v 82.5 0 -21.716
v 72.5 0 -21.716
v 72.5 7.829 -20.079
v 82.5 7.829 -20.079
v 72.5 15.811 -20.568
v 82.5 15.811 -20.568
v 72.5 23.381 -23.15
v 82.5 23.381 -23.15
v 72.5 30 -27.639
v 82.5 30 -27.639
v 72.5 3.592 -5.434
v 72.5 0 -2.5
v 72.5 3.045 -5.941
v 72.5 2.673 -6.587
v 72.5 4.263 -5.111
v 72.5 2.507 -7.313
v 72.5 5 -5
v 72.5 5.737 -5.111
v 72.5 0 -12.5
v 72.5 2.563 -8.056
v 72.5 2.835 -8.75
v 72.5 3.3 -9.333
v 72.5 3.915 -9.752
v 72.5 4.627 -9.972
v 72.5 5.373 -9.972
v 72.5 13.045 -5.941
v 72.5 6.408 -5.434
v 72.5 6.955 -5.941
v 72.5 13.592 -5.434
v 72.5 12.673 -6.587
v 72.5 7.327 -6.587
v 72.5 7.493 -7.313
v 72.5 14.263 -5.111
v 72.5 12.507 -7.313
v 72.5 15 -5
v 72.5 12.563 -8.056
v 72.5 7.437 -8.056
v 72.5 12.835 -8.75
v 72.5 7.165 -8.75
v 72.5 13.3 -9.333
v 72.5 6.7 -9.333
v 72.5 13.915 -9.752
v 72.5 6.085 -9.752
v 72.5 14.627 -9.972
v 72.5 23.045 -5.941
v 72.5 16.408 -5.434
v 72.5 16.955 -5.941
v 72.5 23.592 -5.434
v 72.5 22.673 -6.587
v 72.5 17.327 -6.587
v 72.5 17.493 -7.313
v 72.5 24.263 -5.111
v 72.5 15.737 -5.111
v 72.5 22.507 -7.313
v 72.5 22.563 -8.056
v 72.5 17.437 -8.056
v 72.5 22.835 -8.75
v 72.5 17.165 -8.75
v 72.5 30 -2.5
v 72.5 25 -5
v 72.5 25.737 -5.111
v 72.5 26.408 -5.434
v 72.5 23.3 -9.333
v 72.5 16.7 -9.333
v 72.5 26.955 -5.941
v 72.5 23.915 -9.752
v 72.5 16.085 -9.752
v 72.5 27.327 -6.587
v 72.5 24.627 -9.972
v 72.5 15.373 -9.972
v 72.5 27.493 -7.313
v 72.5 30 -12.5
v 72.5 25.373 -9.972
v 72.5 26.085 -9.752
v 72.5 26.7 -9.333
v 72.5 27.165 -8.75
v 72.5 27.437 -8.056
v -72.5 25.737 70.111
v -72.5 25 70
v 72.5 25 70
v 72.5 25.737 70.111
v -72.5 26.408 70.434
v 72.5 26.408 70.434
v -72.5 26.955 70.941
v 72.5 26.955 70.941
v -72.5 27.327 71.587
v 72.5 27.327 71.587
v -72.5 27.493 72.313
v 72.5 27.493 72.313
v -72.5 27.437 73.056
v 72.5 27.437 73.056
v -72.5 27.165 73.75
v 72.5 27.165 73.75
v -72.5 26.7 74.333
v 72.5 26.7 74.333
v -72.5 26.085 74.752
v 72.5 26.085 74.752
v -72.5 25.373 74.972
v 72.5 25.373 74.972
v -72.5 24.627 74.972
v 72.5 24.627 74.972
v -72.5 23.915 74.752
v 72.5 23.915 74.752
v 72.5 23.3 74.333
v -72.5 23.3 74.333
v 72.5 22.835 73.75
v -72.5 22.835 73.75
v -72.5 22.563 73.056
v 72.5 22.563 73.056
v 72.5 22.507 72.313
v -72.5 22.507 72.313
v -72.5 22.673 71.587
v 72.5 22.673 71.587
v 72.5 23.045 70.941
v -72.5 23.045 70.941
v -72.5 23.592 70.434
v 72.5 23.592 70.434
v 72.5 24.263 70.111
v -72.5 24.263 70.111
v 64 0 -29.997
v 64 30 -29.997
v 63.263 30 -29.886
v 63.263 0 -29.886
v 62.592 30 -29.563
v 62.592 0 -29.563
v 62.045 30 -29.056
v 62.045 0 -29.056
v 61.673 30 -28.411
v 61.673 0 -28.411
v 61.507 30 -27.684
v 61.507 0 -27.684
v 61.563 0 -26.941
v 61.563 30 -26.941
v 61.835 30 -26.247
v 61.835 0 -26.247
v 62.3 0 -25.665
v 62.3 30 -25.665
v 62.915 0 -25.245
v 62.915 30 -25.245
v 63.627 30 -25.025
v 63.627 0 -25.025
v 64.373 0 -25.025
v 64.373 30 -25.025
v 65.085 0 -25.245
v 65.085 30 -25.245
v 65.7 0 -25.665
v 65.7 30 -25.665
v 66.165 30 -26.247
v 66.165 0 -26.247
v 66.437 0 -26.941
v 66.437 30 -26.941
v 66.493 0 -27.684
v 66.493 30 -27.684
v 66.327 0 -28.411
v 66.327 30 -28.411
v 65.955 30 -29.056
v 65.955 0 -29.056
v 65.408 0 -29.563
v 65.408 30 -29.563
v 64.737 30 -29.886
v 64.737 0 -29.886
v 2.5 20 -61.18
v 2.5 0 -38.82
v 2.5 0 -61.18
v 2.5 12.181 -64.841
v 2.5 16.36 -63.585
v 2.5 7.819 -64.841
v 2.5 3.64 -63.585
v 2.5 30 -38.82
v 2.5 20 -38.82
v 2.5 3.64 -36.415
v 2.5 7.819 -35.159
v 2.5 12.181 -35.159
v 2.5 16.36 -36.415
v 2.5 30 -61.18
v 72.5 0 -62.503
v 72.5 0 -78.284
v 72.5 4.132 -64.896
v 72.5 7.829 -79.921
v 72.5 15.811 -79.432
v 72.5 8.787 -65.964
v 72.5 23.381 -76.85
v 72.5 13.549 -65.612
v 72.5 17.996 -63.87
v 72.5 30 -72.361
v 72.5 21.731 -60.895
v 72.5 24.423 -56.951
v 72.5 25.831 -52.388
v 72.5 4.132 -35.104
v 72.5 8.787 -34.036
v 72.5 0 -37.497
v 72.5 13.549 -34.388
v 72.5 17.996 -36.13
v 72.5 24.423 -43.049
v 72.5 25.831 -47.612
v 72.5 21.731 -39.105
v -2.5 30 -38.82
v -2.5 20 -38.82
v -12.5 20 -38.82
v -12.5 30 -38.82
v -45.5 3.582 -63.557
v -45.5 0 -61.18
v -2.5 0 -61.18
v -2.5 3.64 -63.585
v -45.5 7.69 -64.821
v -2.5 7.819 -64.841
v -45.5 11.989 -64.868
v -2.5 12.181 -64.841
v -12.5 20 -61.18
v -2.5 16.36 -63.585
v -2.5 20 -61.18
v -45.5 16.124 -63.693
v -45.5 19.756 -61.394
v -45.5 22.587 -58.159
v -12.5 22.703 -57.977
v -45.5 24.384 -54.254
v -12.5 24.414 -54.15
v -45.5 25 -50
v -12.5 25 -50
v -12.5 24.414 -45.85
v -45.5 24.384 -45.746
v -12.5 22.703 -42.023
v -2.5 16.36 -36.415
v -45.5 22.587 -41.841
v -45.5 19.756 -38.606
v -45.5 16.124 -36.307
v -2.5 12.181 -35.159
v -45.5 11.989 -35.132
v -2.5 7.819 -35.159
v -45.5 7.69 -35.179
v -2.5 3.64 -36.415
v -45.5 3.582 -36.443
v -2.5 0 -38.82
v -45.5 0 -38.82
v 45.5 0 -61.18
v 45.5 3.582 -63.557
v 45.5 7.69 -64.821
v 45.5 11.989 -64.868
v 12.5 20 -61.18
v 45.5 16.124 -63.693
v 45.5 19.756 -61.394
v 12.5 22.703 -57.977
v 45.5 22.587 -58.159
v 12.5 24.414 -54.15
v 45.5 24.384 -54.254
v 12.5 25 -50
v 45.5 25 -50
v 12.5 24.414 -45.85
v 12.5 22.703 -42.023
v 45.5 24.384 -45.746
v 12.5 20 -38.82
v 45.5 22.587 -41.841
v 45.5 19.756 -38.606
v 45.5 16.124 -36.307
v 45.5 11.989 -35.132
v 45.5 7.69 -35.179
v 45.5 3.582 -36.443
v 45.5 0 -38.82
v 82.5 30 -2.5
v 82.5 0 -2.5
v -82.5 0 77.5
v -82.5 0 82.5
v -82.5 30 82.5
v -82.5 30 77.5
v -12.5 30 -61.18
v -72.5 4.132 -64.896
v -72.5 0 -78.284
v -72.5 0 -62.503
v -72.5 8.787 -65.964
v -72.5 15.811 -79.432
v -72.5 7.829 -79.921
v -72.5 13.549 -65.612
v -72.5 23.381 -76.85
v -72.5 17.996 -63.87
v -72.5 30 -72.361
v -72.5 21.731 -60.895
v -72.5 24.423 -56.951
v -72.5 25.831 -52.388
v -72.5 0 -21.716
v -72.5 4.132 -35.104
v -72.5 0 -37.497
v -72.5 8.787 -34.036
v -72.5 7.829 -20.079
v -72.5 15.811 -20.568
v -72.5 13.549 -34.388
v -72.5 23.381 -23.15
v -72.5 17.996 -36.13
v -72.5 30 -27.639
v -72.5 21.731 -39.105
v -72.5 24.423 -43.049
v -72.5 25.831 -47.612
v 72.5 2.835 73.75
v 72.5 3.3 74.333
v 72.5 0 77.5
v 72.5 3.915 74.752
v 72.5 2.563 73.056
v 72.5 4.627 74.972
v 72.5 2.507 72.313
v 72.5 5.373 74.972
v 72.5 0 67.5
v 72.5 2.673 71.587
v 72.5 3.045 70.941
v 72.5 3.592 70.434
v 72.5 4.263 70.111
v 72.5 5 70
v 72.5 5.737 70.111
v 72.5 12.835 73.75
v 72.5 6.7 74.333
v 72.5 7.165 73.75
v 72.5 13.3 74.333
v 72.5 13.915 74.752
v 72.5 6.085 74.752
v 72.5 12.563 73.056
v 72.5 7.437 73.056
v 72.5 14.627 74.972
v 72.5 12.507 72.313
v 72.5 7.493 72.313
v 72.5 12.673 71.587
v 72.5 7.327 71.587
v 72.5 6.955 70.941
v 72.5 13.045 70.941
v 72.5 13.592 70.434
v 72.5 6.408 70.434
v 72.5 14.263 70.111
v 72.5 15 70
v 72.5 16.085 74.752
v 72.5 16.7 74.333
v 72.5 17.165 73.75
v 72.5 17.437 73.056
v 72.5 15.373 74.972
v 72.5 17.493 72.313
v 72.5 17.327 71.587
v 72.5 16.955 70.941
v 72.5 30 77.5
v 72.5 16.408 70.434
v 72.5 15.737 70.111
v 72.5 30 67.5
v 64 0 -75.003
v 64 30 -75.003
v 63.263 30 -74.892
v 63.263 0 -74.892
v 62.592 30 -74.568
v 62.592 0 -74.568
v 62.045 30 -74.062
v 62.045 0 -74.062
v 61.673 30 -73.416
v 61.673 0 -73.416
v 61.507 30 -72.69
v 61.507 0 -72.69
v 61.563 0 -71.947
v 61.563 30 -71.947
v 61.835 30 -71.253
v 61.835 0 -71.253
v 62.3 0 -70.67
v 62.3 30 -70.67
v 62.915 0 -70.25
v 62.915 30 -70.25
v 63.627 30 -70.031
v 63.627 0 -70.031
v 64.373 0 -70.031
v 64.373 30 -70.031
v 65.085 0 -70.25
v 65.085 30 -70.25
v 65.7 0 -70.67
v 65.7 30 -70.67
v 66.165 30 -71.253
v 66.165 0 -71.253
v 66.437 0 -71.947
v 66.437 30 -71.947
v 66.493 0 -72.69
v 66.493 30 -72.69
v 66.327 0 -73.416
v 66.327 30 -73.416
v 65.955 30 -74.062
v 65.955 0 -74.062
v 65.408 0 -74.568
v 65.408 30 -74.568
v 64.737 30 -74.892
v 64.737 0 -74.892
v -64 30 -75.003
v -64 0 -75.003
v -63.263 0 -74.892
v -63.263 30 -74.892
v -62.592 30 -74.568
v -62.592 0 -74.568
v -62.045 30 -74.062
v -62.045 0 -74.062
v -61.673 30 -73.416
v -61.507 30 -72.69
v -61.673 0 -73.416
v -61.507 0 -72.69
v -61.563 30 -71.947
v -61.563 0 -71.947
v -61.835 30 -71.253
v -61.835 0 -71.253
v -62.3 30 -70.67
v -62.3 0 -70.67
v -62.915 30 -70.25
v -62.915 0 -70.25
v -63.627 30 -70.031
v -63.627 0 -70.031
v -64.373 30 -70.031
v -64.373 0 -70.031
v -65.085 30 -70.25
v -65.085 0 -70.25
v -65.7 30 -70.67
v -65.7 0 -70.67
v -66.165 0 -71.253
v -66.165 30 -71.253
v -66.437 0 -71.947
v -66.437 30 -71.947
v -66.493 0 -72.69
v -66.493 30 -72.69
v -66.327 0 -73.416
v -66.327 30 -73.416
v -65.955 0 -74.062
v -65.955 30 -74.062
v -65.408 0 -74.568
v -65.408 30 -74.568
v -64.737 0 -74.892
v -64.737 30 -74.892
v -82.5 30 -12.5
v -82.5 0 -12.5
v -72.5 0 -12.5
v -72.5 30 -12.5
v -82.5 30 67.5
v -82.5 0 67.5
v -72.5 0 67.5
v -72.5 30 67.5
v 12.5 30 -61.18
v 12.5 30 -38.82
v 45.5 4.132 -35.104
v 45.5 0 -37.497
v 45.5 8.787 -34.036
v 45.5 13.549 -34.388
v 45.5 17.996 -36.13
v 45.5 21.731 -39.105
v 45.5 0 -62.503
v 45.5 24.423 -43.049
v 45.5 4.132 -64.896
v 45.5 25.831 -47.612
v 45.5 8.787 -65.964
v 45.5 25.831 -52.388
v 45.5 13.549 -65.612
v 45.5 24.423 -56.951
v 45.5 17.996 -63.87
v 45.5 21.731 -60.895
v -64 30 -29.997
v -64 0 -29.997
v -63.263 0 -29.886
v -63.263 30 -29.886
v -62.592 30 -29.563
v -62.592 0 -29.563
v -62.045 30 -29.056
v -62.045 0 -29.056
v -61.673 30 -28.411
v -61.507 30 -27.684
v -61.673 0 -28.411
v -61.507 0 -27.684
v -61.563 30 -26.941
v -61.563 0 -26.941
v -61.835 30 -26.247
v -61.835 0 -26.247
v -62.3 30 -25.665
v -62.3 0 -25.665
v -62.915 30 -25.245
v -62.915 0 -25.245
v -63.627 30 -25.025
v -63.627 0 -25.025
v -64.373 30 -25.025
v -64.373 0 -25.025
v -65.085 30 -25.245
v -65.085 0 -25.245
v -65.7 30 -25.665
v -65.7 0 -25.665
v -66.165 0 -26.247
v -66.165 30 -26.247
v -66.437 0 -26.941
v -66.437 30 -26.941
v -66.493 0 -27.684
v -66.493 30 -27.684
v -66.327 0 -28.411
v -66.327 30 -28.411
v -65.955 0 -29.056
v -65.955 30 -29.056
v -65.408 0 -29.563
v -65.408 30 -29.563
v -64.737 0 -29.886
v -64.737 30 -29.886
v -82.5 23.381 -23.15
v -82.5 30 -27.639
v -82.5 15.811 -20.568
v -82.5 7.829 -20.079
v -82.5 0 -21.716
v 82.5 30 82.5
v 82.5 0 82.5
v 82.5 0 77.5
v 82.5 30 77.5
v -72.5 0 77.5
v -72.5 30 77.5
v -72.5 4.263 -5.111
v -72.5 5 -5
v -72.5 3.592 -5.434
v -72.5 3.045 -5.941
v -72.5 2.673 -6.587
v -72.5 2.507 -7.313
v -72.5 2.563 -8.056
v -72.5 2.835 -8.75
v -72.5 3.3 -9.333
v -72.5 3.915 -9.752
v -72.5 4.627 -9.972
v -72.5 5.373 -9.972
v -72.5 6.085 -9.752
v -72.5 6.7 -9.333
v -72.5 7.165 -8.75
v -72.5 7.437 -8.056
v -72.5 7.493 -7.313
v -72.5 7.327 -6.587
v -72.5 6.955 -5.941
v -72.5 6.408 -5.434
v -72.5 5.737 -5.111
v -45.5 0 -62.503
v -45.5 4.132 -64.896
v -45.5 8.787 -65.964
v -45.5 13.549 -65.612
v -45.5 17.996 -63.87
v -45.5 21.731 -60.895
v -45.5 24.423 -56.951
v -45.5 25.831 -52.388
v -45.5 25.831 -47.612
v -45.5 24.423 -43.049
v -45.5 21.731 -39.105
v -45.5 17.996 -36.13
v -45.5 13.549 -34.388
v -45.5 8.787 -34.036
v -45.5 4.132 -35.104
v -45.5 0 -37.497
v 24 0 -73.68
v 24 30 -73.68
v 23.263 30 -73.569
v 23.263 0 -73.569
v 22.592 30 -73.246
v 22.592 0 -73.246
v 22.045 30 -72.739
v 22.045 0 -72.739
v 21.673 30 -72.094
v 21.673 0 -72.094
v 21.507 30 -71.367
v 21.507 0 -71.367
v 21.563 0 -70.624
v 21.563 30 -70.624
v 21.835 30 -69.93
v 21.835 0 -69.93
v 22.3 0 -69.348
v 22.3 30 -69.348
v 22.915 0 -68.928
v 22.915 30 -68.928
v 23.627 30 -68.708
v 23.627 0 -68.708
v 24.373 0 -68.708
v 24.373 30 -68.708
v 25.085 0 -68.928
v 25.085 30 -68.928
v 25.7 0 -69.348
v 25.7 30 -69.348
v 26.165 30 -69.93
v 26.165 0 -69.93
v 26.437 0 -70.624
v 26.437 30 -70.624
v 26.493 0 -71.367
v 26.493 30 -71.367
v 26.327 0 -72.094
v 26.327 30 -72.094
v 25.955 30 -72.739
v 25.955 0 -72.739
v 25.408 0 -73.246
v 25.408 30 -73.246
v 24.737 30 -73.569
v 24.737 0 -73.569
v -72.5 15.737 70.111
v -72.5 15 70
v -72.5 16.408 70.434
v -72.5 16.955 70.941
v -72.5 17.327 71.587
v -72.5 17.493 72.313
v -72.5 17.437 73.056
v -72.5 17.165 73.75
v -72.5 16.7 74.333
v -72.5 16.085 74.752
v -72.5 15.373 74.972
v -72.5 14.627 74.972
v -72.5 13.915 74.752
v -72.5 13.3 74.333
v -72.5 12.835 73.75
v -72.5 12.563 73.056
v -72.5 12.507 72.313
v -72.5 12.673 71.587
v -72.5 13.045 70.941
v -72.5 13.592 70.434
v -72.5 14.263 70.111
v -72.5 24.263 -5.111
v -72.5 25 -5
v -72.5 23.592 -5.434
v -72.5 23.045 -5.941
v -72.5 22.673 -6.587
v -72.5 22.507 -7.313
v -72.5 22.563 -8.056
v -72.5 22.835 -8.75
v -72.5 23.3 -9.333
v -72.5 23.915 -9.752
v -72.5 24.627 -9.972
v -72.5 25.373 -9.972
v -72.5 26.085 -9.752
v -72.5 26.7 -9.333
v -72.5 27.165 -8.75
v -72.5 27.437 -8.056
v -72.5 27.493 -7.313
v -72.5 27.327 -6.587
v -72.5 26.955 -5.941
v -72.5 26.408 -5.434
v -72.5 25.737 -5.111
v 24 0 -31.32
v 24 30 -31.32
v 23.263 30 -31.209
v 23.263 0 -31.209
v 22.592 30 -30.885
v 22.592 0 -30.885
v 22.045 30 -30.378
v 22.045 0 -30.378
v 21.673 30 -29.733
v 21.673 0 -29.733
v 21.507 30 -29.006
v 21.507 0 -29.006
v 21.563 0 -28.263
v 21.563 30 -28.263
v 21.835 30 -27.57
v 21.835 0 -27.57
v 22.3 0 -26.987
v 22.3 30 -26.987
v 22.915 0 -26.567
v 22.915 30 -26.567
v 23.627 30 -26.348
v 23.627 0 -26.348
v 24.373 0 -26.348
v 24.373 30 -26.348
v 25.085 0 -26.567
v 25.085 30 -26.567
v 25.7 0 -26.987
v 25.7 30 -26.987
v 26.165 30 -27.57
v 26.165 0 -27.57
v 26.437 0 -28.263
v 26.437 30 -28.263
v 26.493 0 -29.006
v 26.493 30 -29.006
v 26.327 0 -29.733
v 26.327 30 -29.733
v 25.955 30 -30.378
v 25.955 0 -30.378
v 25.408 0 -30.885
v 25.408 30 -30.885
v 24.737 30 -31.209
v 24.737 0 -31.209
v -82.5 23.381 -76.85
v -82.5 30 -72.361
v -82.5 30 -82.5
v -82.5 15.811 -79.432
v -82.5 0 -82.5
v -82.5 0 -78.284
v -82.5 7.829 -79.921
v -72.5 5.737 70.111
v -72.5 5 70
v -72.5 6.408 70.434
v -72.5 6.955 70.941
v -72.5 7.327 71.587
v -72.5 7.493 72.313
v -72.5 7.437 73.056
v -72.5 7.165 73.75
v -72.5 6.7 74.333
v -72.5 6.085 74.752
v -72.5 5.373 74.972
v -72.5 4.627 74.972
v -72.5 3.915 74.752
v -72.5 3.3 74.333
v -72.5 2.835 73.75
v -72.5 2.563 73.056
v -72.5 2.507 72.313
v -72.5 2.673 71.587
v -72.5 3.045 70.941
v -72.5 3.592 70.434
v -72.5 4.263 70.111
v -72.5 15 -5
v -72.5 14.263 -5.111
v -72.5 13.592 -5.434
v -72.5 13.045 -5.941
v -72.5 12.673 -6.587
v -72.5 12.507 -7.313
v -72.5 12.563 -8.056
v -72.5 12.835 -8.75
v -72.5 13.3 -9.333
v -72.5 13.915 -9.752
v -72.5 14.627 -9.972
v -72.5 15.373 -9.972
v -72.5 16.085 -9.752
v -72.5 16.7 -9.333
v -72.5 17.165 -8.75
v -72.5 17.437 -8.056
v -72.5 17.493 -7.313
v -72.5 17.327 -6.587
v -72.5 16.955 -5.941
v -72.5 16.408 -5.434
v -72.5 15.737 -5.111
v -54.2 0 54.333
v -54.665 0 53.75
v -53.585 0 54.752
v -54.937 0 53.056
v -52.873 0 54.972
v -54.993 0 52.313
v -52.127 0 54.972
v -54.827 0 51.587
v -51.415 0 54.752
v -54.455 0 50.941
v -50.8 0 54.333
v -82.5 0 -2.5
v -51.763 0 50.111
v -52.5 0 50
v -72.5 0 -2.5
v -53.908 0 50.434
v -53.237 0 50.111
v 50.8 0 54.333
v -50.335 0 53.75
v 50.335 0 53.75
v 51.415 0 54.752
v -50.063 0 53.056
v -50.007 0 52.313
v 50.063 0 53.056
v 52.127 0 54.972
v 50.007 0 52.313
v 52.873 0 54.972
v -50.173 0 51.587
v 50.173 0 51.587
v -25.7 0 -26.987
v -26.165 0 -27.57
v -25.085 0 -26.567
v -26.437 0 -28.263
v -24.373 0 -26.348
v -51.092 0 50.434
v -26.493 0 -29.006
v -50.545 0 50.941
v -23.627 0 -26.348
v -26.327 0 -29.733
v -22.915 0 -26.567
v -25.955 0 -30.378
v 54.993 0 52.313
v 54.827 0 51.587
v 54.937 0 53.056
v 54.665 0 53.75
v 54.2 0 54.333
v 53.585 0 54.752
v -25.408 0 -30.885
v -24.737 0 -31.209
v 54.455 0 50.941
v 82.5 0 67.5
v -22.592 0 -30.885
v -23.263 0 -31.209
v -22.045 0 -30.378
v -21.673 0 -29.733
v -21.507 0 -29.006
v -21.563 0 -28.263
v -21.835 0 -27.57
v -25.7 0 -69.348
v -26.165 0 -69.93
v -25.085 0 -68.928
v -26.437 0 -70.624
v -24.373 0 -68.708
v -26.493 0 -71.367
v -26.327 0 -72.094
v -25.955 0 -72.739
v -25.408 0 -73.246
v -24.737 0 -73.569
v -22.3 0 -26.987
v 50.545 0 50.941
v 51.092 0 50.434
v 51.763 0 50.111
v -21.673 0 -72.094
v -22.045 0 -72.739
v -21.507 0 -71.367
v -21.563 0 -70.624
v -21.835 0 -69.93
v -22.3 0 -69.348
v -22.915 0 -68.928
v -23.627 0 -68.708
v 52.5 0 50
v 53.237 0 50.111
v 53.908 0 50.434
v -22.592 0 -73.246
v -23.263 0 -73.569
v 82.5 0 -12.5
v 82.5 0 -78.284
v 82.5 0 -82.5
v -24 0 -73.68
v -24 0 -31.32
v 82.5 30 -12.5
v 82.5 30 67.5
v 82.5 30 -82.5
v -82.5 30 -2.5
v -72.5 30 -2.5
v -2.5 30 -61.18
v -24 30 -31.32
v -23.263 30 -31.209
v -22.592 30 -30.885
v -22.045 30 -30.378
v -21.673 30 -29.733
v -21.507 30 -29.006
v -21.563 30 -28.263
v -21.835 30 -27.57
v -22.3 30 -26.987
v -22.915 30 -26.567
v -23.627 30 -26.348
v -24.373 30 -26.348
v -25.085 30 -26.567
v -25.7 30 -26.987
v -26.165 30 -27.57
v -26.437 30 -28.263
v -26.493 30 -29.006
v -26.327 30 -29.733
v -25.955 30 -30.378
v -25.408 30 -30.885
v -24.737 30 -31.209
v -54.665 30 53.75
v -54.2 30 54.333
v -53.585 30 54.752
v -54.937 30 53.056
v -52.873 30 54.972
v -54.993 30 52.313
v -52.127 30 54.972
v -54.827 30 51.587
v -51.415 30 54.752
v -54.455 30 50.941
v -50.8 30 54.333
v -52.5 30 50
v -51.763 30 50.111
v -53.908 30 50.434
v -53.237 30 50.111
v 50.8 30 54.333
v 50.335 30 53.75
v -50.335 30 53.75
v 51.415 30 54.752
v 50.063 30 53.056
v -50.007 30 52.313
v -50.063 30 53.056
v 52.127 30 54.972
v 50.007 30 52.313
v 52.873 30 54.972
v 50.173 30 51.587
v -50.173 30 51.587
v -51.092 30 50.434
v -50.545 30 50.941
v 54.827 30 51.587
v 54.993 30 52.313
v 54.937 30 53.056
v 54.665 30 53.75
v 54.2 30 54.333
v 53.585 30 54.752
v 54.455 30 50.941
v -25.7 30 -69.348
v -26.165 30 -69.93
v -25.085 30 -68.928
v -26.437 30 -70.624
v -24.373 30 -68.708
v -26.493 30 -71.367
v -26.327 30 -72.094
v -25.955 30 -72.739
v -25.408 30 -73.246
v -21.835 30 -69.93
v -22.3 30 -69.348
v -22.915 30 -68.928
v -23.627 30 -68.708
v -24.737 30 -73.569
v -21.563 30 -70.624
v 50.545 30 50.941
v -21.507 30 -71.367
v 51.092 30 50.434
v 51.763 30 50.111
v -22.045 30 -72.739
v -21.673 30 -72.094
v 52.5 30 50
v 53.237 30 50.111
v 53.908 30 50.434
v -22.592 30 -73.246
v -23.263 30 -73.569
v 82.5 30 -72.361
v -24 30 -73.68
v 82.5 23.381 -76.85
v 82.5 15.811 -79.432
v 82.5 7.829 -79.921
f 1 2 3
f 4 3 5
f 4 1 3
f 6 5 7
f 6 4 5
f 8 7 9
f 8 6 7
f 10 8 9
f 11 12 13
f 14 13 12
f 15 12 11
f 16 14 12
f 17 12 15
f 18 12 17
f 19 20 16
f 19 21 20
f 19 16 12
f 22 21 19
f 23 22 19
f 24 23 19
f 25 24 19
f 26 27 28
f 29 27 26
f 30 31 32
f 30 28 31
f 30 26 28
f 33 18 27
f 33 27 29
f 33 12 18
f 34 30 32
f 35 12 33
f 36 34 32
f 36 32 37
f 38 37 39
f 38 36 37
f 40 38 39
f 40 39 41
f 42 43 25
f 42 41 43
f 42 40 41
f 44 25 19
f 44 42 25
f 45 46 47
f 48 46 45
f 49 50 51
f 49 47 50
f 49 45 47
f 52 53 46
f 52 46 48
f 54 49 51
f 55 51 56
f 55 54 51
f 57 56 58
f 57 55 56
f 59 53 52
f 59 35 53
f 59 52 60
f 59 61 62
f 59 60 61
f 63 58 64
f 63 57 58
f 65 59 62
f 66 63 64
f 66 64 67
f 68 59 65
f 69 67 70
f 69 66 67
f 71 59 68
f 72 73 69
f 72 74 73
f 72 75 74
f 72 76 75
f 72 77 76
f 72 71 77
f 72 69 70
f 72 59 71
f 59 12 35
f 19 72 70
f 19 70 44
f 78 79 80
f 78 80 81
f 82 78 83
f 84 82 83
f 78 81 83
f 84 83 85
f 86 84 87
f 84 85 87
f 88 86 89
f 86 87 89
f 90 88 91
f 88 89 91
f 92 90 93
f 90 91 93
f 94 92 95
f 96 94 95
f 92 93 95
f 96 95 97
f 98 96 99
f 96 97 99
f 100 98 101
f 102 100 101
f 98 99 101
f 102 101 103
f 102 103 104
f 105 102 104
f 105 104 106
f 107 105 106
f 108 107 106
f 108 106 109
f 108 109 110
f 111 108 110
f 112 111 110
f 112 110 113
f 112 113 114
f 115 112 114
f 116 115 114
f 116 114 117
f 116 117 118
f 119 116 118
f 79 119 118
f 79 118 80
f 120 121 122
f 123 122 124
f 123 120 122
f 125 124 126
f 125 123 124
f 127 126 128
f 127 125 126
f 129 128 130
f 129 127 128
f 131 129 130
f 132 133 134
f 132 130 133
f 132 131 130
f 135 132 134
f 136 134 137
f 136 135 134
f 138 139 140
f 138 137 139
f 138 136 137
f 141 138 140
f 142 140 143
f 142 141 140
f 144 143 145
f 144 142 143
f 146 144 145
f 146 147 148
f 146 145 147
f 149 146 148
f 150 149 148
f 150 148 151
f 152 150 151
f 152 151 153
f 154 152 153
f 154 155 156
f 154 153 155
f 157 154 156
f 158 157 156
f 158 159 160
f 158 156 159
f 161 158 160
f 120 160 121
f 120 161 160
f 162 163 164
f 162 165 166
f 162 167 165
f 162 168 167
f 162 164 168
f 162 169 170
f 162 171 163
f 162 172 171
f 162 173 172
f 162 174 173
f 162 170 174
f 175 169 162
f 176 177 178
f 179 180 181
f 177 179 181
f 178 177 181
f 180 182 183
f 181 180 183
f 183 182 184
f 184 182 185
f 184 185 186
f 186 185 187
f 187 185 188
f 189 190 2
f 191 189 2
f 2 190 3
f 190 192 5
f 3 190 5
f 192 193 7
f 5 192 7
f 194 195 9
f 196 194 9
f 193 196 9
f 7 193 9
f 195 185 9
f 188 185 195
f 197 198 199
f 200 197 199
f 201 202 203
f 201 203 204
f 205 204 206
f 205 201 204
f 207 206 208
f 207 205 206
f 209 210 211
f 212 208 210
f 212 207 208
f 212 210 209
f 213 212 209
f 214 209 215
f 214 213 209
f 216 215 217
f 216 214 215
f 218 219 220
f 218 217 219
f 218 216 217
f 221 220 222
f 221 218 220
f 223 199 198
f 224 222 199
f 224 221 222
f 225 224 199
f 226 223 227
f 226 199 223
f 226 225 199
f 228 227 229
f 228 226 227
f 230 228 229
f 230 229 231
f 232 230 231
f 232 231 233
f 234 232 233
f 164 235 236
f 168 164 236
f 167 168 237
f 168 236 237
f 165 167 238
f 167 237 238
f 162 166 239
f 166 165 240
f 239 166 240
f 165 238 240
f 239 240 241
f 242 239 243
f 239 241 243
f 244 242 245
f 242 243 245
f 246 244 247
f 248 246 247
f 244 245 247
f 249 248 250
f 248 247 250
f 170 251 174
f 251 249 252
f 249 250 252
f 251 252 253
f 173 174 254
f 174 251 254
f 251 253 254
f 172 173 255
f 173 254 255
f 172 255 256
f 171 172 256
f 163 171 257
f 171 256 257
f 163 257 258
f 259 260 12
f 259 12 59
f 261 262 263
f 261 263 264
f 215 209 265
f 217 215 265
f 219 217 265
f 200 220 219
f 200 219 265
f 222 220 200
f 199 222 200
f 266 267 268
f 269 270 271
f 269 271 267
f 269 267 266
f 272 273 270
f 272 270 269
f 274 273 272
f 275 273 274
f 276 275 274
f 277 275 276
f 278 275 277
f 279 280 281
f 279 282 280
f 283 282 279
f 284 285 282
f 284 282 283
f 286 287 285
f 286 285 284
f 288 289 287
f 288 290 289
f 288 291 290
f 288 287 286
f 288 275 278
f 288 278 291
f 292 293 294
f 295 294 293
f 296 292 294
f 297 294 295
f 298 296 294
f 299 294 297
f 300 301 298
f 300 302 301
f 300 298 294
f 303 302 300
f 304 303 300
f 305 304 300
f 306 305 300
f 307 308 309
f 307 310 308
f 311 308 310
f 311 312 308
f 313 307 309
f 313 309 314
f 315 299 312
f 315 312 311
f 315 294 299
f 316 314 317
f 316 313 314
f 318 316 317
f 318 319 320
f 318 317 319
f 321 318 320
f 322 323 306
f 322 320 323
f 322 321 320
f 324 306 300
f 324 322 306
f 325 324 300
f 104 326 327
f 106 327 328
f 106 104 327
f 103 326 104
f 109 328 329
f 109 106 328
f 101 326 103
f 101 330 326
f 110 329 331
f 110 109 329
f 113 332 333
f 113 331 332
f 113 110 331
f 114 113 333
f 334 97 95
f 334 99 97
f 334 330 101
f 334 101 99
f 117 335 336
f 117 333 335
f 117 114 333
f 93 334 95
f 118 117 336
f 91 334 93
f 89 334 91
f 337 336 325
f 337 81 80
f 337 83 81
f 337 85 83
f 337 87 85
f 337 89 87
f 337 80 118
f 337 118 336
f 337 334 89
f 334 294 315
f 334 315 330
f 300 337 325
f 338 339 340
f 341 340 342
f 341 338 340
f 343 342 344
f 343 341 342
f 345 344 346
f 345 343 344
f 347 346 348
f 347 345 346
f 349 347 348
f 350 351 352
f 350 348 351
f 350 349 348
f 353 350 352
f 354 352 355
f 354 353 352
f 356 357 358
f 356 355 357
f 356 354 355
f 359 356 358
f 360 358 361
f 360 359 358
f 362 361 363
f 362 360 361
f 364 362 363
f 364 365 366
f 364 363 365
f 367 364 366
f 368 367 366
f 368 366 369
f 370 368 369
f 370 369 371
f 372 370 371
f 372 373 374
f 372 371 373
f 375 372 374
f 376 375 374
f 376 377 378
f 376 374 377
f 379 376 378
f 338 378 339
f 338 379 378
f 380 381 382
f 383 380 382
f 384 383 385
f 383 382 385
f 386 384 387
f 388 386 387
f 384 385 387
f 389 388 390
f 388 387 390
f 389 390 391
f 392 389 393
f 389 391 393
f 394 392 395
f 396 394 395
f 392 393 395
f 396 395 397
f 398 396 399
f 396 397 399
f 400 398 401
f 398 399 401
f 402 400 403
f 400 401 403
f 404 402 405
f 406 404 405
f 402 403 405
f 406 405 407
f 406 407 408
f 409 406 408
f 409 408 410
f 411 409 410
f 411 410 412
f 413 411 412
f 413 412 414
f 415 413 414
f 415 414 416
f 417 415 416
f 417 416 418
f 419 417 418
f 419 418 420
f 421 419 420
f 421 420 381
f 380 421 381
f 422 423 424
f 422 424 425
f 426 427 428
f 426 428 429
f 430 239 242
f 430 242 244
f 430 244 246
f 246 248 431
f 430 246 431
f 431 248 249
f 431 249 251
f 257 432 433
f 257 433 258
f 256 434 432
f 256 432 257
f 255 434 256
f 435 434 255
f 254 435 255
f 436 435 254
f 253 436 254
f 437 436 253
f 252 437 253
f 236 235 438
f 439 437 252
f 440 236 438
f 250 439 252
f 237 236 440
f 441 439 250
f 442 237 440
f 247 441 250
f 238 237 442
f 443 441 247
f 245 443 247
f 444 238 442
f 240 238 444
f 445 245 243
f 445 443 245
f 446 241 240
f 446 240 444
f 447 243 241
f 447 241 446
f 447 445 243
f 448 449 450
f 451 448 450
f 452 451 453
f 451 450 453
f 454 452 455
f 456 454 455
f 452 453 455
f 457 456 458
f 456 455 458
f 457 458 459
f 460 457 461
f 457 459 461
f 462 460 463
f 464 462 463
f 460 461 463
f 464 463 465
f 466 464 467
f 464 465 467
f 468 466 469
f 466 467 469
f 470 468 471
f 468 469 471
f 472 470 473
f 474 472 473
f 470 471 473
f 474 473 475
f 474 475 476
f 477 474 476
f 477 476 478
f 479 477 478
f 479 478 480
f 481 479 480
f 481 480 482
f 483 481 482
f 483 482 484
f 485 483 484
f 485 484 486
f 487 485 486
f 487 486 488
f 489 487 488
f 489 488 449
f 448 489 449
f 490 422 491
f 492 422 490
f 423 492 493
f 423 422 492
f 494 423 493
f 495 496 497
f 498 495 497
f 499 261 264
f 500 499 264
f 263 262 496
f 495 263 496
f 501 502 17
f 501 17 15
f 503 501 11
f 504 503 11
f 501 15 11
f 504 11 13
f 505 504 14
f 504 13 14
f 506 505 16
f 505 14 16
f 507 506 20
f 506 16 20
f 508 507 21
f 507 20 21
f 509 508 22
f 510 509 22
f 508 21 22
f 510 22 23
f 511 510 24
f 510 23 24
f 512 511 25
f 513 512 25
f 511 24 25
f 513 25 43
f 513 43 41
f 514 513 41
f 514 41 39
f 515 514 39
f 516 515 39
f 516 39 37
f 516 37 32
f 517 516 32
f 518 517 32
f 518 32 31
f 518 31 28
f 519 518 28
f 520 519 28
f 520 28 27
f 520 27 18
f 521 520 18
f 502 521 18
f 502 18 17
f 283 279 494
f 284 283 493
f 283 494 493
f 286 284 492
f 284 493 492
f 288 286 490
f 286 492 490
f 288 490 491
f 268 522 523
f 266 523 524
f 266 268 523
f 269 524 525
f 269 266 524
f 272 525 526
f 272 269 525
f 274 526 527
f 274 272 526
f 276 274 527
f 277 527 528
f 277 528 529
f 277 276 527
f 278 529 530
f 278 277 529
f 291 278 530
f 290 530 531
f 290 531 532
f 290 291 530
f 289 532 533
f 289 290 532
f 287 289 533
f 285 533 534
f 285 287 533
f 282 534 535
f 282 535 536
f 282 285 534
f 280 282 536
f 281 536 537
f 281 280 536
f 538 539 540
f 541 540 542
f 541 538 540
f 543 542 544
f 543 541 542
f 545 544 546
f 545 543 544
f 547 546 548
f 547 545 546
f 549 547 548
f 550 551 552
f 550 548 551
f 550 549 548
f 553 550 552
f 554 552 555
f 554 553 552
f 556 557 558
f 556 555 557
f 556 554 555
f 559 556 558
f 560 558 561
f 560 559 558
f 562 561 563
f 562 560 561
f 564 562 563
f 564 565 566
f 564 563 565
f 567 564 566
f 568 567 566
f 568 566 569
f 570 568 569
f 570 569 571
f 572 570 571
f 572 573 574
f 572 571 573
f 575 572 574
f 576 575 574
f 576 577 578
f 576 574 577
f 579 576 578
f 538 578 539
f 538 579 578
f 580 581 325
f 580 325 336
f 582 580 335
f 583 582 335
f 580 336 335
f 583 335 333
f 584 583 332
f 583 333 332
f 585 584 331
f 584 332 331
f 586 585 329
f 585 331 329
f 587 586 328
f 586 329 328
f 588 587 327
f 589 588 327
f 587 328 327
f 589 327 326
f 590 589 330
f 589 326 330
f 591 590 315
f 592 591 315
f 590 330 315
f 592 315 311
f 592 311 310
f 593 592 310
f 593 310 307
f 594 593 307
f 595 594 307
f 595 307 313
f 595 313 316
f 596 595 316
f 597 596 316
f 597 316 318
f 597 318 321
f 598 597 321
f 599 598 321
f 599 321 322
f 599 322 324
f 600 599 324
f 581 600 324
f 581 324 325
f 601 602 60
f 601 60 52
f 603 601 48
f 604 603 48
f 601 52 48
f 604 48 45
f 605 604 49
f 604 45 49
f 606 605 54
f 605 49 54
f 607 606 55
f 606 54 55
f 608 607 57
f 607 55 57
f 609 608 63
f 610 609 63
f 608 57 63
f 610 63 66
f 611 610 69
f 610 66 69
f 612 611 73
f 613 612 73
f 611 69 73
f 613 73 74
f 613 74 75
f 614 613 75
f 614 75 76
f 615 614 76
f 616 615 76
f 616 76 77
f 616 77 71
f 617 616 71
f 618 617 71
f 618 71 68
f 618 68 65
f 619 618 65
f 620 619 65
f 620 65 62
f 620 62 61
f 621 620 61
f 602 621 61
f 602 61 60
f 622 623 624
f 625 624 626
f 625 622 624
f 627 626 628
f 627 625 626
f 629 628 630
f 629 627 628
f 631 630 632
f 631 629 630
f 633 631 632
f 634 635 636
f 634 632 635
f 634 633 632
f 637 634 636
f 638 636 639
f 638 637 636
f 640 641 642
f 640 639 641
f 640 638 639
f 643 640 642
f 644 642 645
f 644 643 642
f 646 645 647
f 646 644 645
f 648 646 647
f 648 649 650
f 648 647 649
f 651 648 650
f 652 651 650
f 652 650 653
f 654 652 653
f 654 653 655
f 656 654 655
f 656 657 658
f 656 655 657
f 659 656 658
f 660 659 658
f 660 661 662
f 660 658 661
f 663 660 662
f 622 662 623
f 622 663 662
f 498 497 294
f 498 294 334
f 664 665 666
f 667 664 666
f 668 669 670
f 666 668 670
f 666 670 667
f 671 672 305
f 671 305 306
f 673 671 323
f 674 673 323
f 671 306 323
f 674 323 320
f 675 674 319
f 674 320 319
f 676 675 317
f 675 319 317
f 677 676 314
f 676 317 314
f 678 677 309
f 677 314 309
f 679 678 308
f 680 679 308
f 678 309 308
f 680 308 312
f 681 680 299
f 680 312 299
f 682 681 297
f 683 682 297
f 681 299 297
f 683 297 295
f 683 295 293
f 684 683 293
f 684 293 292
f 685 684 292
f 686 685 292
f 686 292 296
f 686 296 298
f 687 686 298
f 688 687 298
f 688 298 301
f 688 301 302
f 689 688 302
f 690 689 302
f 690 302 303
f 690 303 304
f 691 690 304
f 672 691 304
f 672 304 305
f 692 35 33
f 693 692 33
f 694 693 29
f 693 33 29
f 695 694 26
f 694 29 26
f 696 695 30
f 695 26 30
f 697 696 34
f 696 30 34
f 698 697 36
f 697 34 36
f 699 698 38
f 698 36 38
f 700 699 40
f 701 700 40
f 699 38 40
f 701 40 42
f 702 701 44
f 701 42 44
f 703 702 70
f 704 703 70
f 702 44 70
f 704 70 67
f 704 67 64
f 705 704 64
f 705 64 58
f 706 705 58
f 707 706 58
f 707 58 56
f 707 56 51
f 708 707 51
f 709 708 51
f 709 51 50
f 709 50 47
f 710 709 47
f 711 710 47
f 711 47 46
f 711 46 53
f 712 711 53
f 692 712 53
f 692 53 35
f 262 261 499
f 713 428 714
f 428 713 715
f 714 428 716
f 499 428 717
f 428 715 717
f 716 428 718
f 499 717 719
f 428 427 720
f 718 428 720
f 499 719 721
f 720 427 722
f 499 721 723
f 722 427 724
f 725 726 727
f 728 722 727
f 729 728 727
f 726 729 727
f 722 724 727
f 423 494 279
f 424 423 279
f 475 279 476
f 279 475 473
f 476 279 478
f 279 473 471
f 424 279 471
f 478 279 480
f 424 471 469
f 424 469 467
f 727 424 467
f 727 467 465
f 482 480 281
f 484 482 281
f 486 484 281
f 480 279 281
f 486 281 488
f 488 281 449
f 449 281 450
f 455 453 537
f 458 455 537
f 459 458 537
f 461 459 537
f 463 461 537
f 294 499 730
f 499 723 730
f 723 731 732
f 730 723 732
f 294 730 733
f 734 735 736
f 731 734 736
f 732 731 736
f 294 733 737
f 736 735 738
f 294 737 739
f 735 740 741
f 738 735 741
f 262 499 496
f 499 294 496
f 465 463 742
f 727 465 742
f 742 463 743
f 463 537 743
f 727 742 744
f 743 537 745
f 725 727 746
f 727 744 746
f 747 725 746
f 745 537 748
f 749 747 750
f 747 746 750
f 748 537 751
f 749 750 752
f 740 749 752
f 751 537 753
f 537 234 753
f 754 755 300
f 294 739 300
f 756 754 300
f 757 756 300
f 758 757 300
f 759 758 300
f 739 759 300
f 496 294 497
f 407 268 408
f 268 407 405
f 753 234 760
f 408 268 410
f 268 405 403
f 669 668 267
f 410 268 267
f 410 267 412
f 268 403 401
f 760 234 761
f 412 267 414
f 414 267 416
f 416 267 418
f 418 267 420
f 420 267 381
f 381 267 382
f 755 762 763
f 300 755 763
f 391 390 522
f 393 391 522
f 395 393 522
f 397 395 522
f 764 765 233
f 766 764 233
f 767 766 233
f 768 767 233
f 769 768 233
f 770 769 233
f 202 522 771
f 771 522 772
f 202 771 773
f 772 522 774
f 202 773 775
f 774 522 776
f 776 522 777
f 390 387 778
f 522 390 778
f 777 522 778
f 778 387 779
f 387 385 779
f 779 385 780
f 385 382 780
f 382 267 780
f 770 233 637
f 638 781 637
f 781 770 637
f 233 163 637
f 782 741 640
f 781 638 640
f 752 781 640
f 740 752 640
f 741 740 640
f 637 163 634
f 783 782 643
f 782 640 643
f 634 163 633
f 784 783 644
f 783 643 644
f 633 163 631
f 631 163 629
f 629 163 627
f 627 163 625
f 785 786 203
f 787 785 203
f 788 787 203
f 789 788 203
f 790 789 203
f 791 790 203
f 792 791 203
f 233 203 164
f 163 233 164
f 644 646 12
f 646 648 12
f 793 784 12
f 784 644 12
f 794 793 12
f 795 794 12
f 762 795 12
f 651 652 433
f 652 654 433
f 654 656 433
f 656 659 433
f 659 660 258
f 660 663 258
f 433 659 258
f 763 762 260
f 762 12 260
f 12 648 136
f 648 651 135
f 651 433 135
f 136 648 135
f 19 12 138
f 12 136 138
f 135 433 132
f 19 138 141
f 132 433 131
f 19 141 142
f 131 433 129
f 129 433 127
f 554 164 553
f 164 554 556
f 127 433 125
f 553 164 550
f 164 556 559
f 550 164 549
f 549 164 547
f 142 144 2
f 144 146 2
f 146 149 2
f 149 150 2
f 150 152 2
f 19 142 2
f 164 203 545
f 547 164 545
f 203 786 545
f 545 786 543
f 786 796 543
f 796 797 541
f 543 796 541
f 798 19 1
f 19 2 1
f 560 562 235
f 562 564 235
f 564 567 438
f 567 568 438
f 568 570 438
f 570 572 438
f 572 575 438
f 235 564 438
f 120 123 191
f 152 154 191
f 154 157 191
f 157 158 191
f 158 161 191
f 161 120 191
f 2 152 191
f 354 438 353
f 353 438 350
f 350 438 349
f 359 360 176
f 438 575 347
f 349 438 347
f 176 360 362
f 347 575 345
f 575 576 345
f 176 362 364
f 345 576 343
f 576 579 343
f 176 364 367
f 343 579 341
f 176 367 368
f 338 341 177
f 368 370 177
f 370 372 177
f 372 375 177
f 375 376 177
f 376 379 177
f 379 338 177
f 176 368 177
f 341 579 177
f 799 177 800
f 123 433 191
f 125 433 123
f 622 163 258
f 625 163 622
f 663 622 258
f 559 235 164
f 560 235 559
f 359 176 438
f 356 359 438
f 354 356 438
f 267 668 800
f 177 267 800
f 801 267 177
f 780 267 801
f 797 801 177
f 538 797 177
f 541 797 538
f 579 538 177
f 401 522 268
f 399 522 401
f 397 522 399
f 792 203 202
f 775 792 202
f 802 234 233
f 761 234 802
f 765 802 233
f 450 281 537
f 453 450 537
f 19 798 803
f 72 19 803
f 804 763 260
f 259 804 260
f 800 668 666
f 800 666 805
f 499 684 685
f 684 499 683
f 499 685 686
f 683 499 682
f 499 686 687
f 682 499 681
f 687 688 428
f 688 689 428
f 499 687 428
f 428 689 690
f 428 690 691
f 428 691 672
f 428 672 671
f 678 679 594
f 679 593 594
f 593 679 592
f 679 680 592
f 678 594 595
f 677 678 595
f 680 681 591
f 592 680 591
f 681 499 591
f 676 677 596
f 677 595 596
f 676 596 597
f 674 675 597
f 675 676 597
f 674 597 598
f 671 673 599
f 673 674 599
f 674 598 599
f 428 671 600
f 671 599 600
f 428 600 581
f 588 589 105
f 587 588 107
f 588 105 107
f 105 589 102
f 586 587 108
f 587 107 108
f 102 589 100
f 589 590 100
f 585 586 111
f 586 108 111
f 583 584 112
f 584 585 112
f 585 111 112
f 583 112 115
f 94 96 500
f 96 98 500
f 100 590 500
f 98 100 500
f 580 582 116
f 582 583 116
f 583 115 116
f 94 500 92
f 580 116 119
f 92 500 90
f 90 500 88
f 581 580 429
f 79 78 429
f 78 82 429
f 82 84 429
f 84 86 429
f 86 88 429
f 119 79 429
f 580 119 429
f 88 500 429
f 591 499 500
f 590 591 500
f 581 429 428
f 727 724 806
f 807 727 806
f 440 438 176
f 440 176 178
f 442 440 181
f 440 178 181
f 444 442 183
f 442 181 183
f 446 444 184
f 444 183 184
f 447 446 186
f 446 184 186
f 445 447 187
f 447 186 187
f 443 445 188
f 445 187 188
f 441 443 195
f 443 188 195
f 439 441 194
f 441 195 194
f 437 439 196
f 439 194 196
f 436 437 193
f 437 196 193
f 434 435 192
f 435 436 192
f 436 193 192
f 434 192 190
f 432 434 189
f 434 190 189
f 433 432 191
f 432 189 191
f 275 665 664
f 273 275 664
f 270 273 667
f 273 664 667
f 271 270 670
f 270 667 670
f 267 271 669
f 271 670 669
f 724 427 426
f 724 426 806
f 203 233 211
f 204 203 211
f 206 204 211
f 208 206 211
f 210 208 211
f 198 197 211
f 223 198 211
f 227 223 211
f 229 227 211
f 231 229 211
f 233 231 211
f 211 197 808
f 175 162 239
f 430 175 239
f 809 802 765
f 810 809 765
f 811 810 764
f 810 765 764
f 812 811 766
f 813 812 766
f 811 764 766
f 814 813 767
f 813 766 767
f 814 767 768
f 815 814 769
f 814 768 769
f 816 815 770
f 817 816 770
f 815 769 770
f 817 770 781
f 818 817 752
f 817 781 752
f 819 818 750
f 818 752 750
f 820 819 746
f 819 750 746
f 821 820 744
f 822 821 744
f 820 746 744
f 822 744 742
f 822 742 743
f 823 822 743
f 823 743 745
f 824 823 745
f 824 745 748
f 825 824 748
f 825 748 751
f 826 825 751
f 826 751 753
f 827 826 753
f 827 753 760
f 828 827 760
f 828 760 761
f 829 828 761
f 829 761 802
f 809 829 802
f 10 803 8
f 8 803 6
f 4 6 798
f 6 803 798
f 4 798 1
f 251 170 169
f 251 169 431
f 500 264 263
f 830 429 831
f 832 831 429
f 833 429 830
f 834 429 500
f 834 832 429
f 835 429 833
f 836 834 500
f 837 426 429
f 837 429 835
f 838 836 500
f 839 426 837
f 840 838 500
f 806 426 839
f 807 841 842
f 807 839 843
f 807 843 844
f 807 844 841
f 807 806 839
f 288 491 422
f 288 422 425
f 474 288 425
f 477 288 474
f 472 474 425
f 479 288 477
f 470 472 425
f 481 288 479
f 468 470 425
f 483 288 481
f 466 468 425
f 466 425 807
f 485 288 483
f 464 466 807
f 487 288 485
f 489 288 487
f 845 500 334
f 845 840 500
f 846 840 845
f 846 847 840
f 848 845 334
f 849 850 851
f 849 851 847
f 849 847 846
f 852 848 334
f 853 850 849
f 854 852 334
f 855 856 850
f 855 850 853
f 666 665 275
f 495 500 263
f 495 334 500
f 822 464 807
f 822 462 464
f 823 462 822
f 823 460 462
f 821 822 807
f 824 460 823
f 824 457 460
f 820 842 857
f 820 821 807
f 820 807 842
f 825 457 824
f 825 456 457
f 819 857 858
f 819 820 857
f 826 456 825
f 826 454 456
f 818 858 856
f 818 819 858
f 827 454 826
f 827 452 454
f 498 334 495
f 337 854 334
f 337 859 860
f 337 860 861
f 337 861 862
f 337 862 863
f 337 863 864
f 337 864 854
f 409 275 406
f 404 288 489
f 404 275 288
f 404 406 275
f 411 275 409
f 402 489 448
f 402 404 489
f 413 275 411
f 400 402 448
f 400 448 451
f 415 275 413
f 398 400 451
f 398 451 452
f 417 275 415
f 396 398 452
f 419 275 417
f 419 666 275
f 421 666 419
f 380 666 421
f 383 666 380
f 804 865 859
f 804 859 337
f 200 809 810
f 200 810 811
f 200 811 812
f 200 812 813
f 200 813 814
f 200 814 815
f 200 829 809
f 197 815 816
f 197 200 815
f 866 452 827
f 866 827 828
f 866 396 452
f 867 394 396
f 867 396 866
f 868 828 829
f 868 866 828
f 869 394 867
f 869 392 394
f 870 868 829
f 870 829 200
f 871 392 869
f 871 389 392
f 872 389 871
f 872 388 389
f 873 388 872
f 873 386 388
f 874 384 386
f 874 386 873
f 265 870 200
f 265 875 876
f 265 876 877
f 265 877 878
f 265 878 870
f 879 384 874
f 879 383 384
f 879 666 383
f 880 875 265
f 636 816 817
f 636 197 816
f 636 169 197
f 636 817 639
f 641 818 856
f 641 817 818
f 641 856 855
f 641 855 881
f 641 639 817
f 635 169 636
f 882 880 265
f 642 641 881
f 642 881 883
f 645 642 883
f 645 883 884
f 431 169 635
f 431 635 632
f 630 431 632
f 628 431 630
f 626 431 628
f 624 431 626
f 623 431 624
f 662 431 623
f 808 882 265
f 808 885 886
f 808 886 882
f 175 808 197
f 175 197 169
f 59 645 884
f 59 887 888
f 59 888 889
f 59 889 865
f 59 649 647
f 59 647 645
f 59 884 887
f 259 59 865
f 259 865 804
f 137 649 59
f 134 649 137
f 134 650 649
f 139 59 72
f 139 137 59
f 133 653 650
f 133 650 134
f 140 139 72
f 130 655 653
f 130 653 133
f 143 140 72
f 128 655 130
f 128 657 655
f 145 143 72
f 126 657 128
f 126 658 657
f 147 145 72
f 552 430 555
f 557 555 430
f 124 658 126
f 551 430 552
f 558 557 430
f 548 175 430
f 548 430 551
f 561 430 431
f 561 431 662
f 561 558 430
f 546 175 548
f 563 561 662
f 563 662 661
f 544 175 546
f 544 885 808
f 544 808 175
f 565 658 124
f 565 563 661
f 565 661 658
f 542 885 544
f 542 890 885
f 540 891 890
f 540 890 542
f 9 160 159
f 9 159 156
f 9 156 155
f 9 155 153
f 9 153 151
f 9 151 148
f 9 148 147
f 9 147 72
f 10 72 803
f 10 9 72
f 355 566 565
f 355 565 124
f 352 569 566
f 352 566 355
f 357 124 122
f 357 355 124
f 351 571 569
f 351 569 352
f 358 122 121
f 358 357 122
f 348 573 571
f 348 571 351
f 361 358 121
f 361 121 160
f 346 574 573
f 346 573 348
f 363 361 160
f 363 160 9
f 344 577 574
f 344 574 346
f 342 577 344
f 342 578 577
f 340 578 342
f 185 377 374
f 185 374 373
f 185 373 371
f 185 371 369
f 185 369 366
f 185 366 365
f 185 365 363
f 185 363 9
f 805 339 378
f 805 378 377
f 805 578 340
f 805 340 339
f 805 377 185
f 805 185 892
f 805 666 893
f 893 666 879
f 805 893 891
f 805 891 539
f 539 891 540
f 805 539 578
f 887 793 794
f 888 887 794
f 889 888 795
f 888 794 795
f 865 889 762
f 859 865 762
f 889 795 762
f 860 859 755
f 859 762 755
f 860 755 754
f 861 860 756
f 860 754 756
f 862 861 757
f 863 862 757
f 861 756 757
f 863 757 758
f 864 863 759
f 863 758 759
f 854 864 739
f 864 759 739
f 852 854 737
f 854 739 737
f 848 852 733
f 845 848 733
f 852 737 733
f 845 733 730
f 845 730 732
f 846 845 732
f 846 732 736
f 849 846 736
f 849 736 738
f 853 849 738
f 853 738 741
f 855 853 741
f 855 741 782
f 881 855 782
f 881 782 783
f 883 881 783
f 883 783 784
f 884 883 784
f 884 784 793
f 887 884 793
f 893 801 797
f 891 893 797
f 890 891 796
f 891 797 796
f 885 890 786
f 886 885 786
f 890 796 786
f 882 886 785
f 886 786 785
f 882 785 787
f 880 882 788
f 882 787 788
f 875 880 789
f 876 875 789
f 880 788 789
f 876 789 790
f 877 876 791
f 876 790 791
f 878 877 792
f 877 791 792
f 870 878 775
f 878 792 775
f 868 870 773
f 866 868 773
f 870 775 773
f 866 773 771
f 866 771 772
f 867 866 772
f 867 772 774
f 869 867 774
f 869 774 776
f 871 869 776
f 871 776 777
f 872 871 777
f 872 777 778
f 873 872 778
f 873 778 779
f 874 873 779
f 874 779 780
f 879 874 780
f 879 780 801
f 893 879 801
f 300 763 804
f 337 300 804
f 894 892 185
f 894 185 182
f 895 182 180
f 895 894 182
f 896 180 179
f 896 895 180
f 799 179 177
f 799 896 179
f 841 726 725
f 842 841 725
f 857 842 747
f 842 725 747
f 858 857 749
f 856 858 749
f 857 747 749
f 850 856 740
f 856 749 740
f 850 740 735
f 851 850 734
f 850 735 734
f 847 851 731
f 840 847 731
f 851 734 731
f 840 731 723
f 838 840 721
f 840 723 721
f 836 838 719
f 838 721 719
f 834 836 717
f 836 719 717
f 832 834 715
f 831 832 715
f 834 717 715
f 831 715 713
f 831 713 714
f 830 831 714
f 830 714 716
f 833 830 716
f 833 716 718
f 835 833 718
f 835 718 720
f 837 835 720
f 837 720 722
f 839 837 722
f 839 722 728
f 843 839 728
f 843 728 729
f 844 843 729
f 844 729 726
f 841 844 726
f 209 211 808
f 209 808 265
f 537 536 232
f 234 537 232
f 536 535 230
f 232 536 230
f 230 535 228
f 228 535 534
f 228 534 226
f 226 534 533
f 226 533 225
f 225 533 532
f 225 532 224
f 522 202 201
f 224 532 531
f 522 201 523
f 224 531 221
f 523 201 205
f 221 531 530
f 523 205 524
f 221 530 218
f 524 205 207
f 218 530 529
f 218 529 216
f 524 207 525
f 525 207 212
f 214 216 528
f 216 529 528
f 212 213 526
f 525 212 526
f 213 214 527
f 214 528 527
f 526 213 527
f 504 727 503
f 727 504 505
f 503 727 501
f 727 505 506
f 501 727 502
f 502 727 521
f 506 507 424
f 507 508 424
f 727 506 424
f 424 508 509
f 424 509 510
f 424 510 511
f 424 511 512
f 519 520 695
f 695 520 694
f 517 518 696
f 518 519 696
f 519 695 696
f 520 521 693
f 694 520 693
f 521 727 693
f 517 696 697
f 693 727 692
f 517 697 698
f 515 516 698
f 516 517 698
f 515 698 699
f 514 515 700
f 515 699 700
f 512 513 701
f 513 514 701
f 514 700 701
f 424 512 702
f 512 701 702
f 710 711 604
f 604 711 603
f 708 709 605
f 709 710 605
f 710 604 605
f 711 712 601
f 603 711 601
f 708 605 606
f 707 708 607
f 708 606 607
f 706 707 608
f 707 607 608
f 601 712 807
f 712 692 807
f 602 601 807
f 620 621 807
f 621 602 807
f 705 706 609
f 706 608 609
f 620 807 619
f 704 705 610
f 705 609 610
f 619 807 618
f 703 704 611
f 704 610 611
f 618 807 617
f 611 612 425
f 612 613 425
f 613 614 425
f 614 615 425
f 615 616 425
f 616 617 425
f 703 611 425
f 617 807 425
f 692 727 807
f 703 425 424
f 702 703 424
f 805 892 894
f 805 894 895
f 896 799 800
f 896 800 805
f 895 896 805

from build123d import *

# Parameters (mm, degrees)
ESQUISSE2_W         = 165
ESQUISSE2_H         = 165
BASE_DEPTH          = 30
ESQUISSE3_R         = 15
BLOC_MOTEUR_1_DEPTH = 80
ESQUISSE4_W         = 10
ESQUISSE4_H         = 22.360679774
ACCES_MOTEUR_DEPTH  = 37
ESQUISSE6_R         = 16.01
BLOC_MOTEUR_2_DEPTH = 37
ESQUISSE7_R         = 2.5
VIS_MOTEUR_DEPTH    = 121.467838032
ESQUISSE8_R         = 2.5
VIS_PATIN_DEPTH     = 121.467838032
ESQUISSE12_R        = 30
ESPACE_ROUE_DEPTH   = 10
ESQUISSE23_W        = 10
ESQUISSE23_H        = 30
VIDE_TIGE_DEPTH     = 10
VIDE_VIS_REACH      = 180.133
ESQUISSE25_R        = 2.5


with BuildPart() as part:
    # Esquisse2 → BASE (new body)
    with BuildSketch(Plane(origin=(0, 0, 0), x_dir=(1, 0, 0), z_dir=(0, 1, 0))):
        Rectangle(ESQUISSE2_W, ESQUISSE2_H)
    extrude(amount=BASE_DEPTH)

    # Esquisse3 → BLOC MOTEUR 1. (cut)
    with BuildSketch(Plane(origin=(82.5, 0, 0), x_dir=(0, 0, -1), z_dir=(1, 0, 0))):
        with Locations((50, 10)):
            Circle(ESQUISSE3_R)
    bloc_moteur_1 = extrude(amount=-BLOC_MOTEUR_1_DEPTH, mode=Mode.SUBTRACT)

    # Esquisse4 → ACCES MOTEUR (cut)
    with BuildSketch(Plane.XZ):
        with Locations((7.5, -50)):
            Rectangle(ESQUISSE4_W, ESQUISSE4_H)
    acces_moteur = extrude(amount=-ACCES_MOTEUR_DEPTH, mode=Mode.SUBTRACT)

    # Esquisse6 → BLOC MOTEUR 2 (cut)
    with BuildSketch(Plane(origin=(82.5, 0, 0), x_dir=(0, 0, -1), z_dir=(1, 0, 0))):
        with Locations((50, 10)):
            Circle(ESQUISSE6_R)
    bloc_moteur_2 = extrude(amount=-BLOC_MOTEUR_2_DEPTH, mode=Mode.SUBTRACT)

    # SYM BLOC MOTEUR: BLOC MOTEUR 1., ACCES MOTEUR, BLOC MOTEUR 2 across plane
    add(bloc_moteur_1.mirror(Plane(origin=(0, 0, 0), x_dir=(0, 0, 1), z_dir=(1, 0, 0))), mode=Mode.SUBTRACT)
    add(acces_moteur.mirror(Plane(origin=(0, 0, 0), x_dir=(0, 0, 1), z_dir=(1, 0, 0))), mode=Mode.SUBTRACT)
    add(bloc_moteur_2.mirror(Plane(origin=(0, 0, 0), x_dir=(0, 0, 1), z_dir=(1, 0, 0))), mode=Mode.SUBTRACT)

    # Esquisse7 → VIS MOTEUR (cut, through all)
    with BuildSketch(Plane.XZ):
        with Locations(Location((-64, -27.497196314, 0), (0, 0, 270))):
            Circle(ESQUISSE7_R)
        with Locations(Location((-24, -28.819660113, 0), (0, 0, 270))):
            Circle(ESQUISSE7_R)
        with Locations(Location((-24, -71.180339887, 0), (0, 0, 270))):
            Circle(ESQUISSE7_R)
        with Locations(Location((-64, -72.502803686, 0), (0, 0, 270))):
            Circle(ESQUISSE7_R)
    vis_moteur = extrude(amount=-VIS_MOTEUR_DEPTH, mode=Mode.SUBTRACT)

    # SYM VIS: VIS MOTEUR across plane
    add(vis_moteur.mirror(Plane(origin=(0, 0, 0), x_dir=(0, 0, 1), z_dir=(1, 0, 0))), mode=Mode.SUBTRACT)

    # Esquisse8 → VIS PATIN (cut, through all)
    with BuildSketch(Plane.XZ):
        with Locations(Location((-52.5, 52.5, 0), (0, 0, 270))):
            Circle(ESQUISSE8_R)
        with Locations(Location((52.5, 52.5, 0), (0, 0, 270))):
            Circle(ESQUISSE8_R)
    extrude(amount=-VIS_PATIN_DEPTH, mode=Mode.SUBTRACT)

    # Esquisse12 → ESPACE ROUE (cut)
    with BuildSketch(Plane.ZY.offset(82.5)):
        with Locations((-50, 10)):
            Circle(ESQUISSE12_R)
    espace_roue = extrude(amount=-ESPACE_ROUE_DEPTH, mode=Mode.SUBTRACT)

    # SYM ESPACE ROUE: ESPACE ROUE across plane
    add(espace_roue.mirror(Plane(origin=(0, 0, 0), x_dir=(0, 0, 1), z_dir=(1, 0, 0))), mode=Mode.SUBTRACT)

    # Esquisse23 → VIDE TIGE (cut)
    with BuildSketch(Plane(origin=(82.5, 0, 0), x_dir=(0, 0, -1), z_dir=(1, 0, 0))):
        with Locations((-72.5, 15)):
            Rectangle(ESQUISSE23_W, ESQUISSE23_H)
        with Locations((7.5, 15)):
            Rectangle(ESQUISSE23_W, ESQUISSE23_H)
    vide_tige = extrude(amount=-VIDE_TIGE_DEPTH, mode=Mode.SUBTRACT)

    # SYM TIGE: VIDE TIGE across plane
    add(vide_tige.mirror(Plane(origin=(0, 0, 0), x_dir=(0, 0, 1), z_dir=(1, 0, 0))), mode=Mode.SUBTRACT)

    # Esquisse25 → VIDE VIS (cut, up to next)
    with BuildSketch(Plane(origin=(72.5, 0, 0), x_dir=(0, 0, -1), z_dir=(1, 0, 0)), mode=Mode.PRIVATE) as vide_vis_sk1:
        with Locations((-72.5, 25)):
            Circle(ESQUISSE25_R)
    vide_vis_tool1 = extrude(vide_vis_sk1.sketch, amount=-VIDE_VIS_REACH, mode=Mode.PRIVATE) & part.part
    # Esquisse25 → VIDE VIS (cut, up to next)
    with BuildSketch(Plane(origin=(72.5, 0, 0), x_dir=(0, 0, -1), z_dir=(1, 0, 0)), mode=Mode.PRIVATE) as vide_vis_sk2:
        with Locations((-72.5, 15)):
            Circle(ESQUISSE25_R)
    vide_vis_tool2 = extrude(vide_vis_sk2.sketch, amount=-VIDE_VIS_REACH, mode=Mode.PRIVATE) & part.part
    # Esquisse25 → VIDE VIS (cut, up to next)
    with BuildSketch(Plane(origin=(72.5, 0, 0), x_dir=(0, 0, -1), z_dir=(1, 0, 0)), mode=Mode.PRIVATE) as vide_vis_sk3:
        with Locations((-72.5, 5)):
            Circle(ESQUISSE25_R)
    vide_vis_tool3 = extrude(vide_vis_sk3.sketch, amount=-VIDE_VIS_REACH, mode=Mode.PRIVATE) & part.part
    # Esquisse25 → VIDE VIS (cut, up to next)
    with BuildSketch(Plane(origin=(72.5, 0, 0), x_dir=(0, 0, -1), z_dir=(1, 0, 0)), mode=Mode.PRIVATE) as vide_vis_sk4:
        with Locations(Location((7.5, 5, 0), (0, 0, 180))):
            Circle(ESQUISSE25_R)
    vide_vis_tool4 = extrude(vide_vis_sk4.sketch, amount=-VIDE_VIS_REACH, mode=Mode.PRIVATE) & part.part
    # Esquisse25 → VIDE VIS (cut, up to next)
    with BuildSketch(Plane(origin=(72.5, 0, 0), x_dir=(0, 0, -1), z_dir=(1, 0, 0)), mode=Mode.PRIVATE) as vide_vis_sk5:
        with Locations(Location((7.5, 25, 0), (0, 0, 180))):
            Circle(ESQUISSE25_R)
    vide_vis_tool5 = extrude(vide_vis_sk5.sketch, amount=-VIDE_VIS_REACH, mode=Mode.PRIVATE) & part.part
    # Esquisse25 → VIDE VIS (cut, up to next)
    with BuildSketch(Plane(origin=(72.5, 0, 0), x_dir=(0, 0, -1), z_dir=(1, 0, 0)), mode=Mode.PRIVATE) as vide_vis_sk6:
        with Locations(Location((7.5, 15, 0), (0, 0, 180))):
            Circle(ESQUISSE25_R)
    vide_vis_tool6 = extrude(vide_vis_sk6.sketch, amount=-VIDE_VIS_REACH, mode=Mode.PRIVATE) & part.part
    add(vide_vis_tool1.solids().sort_by_distance((72.5, 25, 72.5))[0], mode=Mode.SUBTRACT)
    add(vide_vis_tool2.solids().sort_by_distance((72.5, 15, 72.5))[0], mode=Mode.SUBTRACT)
    add(vide_vis_tool3.solids().sort_by_distance((72.5, 5, 72.5))[0], mode=Mode.SUBTRACT)
    add(vide_vis_tool4.solids().sort_by_distance((72.5, 5, -7.5))[0], mode=Mode.SUBTRACT)
    add(vide_vis_tool5.solids().sort_by_distance((72.5, 25, -7.5))[0], mode=Mode.SUBTRACT)
    add(vide_vis_tool6.solids().sort_by_distance((72.5, 15, -7.5))[0], mode=Mode.SUBTRACT)


solid = part.part
